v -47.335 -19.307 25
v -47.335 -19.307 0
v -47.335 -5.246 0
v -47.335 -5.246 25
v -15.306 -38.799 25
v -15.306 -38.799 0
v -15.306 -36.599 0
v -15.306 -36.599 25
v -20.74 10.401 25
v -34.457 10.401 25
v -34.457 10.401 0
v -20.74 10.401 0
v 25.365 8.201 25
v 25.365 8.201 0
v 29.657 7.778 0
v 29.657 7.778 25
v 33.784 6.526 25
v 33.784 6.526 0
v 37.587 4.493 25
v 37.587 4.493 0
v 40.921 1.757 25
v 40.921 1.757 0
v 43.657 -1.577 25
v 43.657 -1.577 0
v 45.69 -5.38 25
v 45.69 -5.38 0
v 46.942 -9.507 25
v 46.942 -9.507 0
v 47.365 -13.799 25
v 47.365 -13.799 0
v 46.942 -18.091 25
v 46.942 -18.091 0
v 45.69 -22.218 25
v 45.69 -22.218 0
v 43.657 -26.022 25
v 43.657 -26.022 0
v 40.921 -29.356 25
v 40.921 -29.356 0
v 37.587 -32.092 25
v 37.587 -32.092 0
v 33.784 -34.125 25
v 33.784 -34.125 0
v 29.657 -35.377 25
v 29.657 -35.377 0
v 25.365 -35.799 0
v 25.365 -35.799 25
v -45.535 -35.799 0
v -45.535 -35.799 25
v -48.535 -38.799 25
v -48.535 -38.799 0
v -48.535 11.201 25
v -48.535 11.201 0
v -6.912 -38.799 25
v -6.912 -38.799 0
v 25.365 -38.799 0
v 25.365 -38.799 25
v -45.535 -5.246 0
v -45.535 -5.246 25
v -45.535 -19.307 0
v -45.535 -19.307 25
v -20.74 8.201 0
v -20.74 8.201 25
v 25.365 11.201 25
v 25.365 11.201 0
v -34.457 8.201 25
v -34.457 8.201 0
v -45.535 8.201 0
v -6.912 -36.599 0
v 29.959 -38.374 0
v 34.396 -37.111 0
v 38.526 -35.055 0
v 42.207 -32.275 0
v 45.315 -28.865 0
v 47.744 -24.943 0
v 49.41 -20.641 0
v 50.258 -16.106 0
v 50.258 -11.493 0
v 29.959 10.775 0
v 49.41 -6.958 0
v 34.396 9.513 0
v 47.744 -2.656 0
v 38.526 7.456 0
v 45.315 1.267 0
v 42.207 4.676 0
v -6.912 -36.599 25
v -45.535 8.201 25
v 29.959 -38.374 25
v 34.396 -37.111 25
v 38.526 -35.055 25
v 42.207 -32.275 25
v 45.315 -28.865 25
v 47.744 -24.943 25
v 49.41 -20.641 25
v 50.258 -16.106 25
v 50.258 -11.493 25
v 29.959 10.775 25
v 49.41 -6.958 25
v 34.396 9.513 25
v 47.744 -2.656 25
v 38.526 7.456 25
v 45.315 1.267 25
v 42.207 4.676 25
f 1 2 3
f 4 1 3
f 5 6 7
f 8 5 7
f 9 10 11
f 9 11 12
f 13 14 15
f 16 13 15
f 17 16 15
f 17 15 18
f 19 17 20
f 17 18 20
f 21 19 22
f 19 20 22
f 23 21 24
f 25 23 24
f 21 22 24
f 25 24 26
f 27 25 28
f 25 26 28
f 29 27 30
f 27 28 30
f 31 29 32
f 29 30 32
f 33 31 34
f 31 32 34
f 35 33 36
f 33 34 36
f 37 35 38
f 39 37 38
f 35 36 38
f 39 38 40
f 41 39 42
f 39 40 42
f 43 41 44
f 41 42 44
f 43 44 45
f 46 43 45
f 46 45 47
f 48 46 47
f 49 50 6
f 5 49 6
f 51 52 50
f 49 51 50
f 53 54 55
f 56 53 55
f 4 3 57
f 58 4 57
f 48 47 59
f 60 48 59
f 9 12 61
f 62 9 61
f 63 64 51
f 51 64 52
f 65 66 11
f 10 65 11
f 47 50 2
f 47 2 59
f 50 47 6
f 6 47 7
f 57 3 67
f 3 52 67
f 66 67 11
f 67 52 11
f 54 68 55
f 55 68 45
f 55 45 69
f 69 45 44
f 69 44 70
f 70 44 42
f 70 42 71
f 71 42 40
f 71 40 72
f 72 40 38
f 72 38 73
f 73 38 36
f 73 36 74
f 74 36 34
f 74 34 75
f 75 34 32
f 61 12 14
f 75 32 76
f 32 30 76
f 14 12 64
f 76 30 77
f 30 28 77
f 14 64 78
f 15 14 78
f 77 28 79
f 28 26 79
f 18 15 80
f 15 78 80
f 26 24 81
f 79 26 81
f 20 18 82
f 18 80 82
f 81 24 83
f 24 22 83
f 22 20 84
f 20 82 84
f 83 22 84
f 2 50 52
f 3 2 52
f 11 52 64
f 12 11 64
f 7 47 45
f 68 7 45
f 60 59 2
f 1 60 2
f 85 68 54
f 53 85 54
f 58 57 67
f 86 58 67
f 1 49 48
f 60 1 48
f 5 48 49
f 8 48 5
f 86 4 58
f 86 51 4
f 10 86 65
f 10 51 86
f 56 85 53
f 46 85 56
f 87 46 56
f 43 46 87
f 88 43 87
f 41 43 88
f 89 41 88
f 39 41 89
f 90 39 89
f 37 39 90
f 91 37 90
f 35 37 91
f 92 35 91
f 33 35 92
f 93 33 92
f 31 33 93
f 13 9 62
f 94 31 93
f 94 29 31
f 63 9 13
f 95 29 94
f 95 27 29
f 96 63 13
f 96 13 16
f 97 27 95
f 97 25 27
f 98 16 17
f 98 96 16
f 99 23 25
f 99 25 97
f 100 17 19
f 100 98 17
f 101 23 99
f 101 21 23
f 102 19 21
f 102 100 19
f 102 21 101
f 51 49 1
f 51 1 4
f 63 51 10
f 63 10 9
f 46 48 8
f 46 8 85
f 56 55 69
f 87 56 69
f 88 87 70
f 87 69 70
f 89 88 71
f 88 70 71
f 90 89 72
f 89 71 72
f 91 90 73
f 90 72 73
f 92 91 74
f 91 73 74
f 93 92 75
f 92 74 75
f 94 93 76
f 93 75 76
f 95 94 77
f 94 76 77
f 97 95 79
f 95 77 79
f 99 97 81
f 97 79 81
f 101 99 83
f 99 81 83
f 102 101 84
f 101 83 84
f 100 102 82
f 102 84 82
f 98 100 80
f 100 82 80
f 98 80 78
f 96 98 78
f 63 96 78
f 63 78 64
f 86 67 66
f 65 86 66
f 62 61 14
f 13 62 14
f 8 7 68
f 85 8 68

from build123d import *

# Parameters (mm, degrees)
F1_DEPTH = 25


with BuildPart() as f1:
    # F0 (on Top) → F1 (new body)
    with BuildSketch(Plane.XY):
        with BuildLine():
            Line((-30.05274, 11.200704), (-48.534881, 11.200704))
            Line((-48.534881, 11.200704), (-48.534881, -38.799296))
            Line((-48.534881, -38.799296), (-15.306122, -38.799296))
            Line((-15.306122, -38.799296), (-15.306122, -36.599296))
            Line((-15.306122, -36.599296), (-6.91196, -36.599296))
            Line((-6.91196, -36.599296), (-6.91196, -38.799296))
            Line((-6.91196, -38.799296), (25.364829, -38.799296))
            ThreePointArc((25.364829, -38.799296), (50.364829, -13.799296), (25.364829, 11.200704))
            Line((25.364829, 11.200704), (-19.365611, 11.200704))
            Line((-19.365611, 11.200704), (-30.05274, 11.200704))
        make_face()
        with BuildLine():
            Line((-45.534881, -5.245955), (-45.534881, 8.200704))
            Line((-45.534881, 8.200704), (-34.456972, 8.200704))
            Line((-34.456972, 8.200704), (-34.456972, 10.400704))
            Line((-34.456972, 10.400704), (-20.740092, 10.400704))
            Line((-20.740092, 10.400704), (-20.740092, 8.200704))
            Line((-20.740092, 8.200704), (25.364829, 8.200704))
            ThreePointArc((25.364829, 8.200704), (47.364829, -13.799296), (25.364829, -35.799296))
            Line((25.364829, -35.799296), (-45.534881, -35.799296))
            Line((-45.534881, -35.799296), (-45.534881, -19.307144))
            Line((-45.534881, -19.307144), (-47.334881, -19.307144))
            Line((-47.334881, -19.307144), (-47.334881, -5.245955))
            Line((-47.334881, -5.245955), (-45.534881, -5.245955))
        make_face(mode=Mode.SUBTRACT)
    extrude(amount=F1_DEPTH)


solid = f1.part
